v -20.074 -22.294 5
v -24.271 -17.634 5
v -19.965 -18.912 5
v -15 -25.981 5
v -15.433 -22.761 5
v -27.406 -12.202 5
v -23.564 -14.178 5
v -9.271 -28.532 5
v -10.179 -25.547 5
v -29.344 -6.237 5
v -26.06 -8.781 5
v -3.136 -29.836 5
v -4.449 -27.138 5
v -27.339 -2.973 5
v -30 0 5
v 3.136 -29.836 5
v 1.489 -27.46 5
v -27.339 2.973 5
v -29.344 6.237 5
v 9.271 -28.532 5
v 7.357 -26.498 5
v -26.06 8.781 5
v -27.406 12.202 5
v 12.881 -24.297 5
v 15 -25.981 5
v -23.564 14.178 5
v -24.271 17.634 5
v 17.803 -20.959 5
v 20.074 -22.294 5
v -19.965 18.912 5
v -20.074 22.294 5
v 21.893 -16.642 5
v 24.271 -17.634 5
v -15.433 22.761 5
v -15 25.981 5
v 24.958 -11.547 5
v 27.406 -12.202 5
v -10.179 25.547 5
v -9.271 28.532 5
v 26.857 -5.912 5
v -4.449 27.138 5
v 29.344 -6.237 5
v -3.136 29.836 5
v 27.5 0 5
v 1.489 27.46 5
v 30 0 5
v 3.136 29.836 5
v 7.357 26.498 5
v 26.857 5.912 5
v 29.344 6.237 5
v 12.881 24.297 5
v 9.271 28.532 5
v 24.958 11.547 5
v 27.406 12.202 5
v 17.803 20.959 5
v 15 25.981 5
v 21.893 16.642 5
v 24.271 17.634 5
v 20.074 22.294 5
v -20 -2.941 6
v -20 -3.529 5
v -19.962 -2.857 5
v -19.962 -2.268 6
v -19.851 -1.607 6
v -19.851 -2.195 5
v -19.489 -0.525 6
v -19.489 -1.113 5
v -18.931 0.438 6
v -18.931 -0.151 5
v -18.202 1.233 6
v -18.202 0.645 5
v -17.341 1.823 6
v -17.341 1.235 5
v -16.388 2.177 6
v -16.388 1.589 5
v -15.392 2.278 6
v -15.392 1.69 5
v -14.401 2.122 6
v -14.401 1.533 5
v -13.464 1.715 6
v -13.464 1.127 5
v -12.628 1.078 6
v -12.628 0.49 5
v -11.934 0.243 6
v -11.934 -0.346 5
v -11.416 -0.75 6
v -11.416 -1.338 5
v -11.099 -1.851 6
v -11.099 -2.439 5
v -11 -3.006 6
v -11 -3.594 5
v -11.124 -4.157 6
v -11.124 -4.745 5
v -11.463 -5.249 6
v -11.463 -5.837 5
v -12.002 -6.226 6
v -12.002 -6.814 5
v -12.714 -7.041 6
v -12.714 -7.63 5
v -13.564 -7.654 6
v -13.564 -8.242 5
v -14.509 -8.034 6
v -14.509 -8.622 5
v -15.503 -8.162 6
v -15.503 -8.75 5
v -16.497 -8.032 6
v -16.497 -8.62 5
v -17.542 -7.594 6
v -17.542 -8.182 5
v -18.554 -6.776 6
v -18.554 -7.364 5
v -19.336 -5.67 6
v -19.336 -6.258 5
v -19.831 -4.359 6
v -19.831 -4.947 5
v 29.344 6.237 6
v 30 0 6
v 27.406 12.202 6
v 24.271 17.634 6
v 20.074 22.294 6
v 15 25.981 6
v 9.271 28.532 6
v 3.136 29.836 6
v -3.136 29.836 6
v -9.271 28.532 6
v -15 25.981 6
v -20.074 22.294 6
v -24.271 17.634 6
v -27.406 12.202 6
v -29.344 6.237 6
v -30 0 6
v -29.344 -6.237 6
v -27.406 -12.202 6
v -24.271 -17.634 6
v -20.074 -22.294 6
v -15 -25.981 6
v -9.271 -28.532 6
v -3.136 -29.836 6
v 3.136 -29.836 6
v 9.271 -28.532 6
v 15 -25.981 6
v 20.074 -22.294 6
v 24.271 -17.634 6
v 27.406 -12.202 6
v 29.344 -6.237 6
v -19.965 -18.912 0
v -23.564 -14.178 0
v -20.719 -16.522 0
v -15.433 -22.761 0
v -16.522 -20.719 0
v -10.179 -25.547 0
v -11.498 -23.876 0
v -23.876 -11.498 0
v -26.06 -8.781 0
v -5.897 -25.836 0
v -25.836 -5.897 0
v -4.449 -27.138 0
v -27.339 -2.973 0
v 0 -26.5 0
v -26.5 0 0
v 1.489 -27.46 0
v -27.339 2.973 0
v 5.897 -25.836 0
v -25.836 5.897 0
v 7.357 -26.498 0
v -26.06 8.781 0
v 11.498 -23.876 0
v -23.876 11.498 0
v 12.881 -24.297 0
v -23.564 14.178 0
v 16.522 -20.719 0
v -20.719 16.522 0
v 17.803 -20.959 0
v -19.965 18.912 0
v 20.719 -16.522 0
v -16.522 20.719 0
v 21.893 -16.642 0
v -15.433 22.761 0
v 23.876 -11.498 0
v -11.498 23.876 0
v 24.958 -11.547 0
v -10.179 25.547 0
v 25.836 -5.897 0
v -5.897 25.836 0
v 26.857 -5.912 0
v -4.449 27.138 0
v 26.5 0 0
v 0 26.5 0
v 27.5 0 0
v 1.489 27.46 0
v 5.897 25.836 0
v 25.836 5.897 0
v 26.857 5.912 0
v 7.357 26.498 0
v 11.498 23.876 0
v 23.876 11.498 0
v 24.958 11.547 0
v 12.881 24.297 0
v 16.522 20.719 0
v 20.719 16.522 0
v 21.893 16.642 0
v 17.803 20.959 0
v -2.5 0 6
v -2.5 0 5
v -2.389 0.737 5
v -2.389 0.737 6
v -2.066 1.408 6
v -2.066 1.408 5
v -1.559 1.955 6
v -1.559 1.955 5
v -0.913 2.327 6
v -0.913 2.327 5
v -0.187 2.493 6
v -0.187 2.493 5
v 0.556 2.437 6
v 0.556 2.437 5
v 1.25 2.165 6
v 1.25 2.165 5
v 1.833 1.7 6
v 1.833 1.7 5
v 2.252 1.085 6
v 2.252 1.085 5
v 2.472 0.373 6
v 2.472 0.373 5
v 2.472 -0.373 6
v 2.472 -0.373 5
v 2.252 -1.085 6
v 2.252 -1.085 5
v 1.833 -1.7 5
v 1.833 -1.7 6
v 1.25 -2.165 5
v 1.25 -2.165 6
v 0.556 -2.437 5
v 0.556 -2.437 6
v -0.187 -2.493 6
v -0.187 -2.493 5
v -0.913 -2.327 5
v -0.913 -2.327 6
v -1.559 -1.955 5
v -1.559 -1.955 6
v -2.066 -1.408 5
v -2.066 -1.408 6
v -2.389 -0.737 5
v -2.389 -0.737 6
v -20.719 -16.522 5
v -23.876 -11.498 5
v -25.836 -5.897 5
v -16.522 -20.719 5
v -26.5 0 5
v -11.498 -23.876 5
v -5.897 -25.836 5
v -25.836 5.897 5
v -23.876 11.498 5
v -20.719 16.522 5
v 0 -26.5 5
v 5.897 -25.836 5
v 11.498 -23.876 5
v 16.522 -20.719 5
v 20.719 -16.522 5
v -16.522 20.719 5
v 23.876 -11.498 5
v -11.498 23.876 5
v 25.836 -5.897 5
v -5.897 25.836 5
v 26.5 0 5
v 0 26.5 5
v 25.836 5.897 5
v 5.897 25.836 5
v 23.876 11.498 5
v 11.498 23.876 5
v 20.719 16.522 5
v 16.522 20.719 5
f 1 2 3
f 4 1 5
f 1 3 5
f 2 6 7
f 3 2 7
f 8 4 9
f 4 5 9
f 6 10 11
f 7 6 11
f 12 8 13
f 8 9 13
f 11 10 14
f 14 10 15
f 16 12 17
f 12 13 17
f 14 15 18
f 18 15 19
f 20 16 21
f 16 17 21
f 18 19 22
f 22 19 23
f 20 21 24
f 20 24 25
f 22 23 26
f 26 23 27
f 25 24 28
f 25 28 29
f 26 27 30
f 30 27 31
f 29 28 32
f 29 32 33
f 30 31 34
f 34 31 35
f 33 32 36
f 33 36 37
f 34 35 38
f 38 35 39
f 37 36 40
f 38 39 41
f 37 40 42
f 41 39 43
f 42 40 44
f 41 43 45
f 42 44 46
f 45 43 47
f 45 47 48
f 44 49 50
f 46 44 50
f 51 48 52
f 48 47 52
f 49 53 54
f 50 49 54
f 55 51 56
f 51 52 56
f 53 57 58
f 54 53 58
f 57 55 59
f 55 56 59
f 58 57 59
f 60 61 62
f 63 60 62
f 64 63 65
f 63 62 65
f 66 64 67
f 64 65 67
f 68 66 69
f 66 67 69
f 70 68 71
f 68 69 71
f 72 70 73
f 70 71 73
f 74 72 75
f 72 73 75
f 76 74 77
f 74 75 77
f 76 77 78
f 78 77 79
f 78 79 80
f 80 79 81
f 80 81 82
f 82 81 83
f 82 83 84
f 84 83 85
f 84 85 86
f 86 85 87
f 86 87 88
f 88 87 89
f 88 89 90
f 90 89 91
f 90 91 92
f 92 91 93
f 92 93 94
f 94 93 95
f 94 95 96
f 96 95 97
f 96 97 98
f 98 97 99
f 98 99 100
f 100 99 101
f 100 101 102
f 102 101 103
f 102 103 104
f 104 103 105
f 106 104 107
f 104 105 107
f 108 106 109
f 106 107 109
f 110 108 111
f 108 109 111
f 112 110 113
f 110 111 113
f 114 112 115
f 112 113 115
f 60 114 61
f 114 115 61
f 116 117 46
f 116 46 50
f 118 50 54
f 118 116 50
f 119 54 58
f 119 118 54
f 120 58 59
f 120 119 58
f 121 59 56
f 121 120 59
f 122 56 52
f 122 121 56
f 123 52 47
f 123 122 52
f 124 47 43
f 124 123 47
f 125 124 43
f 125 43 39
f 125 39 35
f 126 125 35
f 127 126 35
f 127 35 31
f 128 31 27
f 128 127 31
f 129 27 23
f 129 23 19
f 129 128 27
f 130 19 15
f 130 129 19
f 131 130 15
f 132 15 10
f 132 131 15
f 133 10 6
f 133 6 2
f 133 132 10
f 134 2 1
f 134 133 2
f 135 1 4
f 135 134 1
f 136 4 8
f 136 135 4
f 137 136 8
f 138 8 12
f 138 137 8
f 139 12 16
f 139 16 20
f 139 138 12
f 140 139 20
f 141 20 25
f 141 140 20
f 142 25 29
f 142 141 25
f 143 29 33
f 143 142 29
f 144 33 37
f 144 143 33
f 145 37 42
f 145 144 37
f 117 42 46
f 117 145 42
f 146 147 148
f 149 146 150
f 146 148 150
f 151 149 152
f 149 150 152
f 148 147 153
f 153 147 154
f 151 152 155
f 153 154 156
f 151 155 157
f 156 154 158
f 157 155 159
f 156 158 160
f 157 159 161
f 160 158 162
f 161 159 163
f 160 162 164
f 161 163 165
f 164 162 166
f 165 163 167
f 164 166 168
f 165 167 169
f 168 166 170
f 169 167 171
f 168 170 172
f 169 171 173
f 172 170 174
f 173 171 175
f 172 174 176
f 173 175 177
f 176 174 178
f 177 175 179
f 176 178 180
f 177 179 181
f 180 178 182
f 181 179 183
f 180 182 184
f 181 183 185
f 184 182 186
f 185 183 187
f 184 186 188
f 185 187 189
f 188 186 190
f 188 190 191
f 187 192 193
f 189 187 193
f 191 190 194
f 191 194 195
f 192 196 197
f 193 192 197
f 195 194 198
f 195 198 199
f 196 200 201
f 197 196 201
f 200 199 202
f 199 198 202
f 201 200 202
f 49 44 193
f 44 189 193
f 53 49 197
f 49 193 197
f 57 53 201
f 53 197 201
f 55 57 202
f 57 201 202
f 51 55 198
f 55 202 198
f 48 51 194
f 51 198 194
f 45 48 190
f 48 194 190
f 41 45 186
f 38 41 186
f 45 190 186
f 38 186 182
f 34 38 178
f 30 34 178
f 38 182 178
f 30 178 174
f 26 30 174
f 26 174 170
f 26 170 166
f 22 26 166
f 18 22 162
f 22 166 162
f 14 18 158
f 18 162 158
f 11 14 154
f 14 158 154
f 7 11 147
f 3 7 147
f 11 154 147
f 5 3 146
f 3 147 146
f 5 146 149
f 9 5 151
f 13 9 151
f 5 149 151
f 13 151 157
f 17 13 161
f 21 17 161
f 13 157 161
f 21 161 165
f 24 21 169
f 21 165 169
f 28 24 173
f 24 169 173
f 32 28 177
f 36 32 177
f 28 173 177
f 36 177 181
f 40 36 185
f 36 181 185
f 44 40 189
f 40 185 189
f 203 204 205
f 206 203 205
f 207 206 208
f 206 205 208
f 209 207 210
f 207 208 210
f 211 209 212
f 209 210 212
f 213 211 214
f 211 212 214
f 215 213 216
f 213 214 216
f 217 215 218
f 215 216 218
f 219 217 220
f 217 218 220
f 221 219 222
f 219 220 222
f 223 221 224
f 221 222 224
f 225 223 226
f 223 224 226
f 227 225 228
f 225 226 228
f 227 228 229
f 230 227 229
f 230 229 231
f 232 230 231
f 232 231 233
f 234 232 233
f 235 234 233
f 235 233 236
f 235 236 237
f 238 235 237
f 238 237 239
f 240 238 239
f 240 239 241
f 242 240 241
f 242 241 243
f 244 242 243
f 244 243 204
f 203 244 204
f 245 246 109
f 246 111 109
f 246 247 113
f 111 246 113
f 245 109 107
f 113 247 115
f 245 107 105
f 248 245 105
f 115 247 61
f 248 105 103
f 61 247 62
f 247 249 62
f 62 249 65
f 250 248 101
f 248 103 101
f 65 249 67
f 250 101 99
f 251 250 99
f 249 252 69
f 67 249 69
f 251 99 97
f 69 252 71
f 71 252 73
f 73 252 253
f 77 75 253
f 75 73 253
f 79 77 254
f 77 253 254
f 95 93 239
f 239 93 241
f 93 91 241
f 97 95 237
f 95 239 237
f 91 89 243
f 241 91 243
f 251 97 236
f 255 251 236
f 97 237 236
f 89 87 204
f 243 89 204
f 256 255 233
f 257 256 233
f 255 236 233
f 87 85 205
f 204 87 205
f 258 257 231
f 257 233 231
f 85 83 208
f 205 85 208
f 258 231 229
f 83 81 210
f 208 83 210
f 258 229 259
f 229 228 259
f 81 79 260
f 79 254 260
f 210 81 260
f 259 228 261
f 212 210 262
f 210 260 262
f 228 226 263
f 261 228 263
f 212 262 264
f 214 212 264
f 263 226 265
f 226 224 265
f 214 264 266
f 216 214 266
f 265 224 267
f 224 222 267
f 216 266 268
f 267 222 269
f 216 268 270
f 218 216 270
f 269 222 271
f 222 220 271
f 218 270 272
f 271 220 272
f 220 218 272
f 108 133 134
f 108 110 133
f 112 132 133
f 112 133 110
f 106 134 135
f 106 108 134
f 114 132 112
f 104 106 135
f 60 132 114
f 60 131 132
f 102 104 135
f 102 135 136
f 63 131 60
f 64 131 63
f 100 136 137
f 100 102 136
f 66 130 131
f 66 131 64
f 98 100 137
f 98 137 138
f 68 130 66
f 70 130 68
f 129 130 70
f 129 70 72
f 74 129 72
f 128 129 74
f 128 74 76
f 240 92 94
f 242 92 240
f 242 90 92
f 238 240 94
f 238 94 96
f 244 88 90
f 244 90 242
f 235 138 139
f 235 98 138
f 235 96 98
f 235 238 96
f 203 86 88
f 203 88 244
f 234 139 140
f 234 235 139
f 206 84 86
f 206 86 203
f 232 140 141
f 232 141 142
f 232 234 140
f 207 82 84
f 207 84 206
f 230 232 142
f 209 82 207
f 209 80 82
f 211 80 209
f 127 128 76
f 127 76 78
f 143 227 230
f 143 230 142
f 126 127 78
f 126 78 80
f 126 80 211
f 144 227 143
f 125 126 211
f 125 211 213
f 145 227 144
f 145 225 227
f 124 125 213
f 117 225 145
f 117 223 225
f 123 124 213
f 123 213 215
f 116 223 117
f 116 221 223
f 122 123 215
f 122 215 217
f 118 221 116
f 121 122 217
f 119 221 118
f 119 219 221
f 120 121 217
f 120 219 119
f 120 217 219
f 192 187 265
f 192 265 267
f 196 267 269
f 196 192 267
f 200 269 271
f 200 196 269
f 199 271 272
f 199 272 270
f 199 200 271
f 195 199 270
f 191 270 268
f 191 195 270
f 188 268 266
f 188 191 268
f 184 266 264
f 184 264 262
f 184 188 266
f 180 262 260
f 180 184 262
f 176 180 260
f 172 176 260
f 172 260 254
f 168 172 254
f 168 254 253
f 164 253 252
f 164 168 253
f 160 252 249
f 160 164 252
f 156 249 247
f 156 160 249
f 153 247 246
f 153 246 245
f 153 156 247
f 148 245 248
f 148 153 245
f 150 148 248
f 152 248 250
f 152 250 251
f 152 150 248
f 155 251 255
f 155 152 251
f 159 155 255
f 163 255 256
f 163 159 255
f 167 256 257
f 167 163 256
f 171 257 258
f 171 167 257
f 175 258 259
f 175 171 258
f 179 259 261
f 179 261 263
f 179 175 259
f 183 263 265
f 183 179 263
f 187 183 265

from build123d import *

# Parameters (mm, degrees)
F0_R      = 27.5
F0_R_2    = 26.5
F1_DEPTH  = 5
F2_R      = 27.5
F3_DEPTH  = 1
F5_DEPTH  = 25
F6_DEPTH  = 6
F8_D      = 9
F8_DEPTH  = 30
F8_TIP    = 2.7038727856
F9_DEPTH  = 25
F11_D     = 5
F11_DEPTH = 30
F11_TIP   = 1.5021515476
F12_R     = 30
F12_R_2   = 27.5
F13_DEPTH = 1


with BuildPart() as f1:
    # F0 (on Top) → F1 (new body)
    with BuildSketch(Plane.XY):
        Circle(F0_R)
        Circle(F0_R_2, mode=Mode.SUBTRACT)
    extrude(amount=F1_DEPTH)

    # F2 (on face) → F3 (join)
    with BuildSketch(Plane.XY.offset(5)):
        Circle(F2_R)
    extrude(amount=F3_DEPTH)

    # F4 (on Right) → F5 (join)
    with BuildSketch(Plane.YZ):
        Polygon((-8.5, 6), (0, 6), (8.5, 6), (-8.5, 16), align=None)
    extrude(amount=-F5_DEPTH)

    # F6 (cut): a face of the model
    f6_faces = [f1.faces().sort_by_distance(p)[0] for p in [
        (0, -2.8333333333, 9.3333333333),
    ]]
    extrude(f6_faces, amount=-F6_DEPTH, mode=Mode.SUBTRACT)

    # F8
    with Locations(Plane(origin=(0, 4.8071979434, 8.1722365039), x_dir=(1, 0, 0), z_dir=(0, 0.5070201266, 0.8619342152))):
        with Locations((-15.5, -5.5772213922)):
            Hole(F8_D / 2, depth=F8_DEPTH)
            with Locations((0, 0, -(F8_DEPTH + F8_TIP / 2))):  # 118° drill point
                Cone(0, F8_D / 2, F8_TIP, mode=Mode.SUBTRACT)

    # F9 (cut): a face of the model
    f9_faces = [f1.faces().sort_by_distance(p)[0] for p in [
        (-25, -2.8333333333, 9.3333333333),
    ]]
    extrude(f9_faces, amount=-F9_DEPTH, mode=Mode.SUBTRACT)

    # F11
    with Locations(Plane.XY.offset(6)):
        with Locations((0, 0)):
            Hole(F11_D / 2, depth=F11_DEPTH)
            with Locations((0, 0, -(F11_DEPTH + F11_TIP / 2))):  # 118° drill point
                Cone(0, F11_D / 2, F11_TIP, mode=Mode.SUBTRACT)

    # F12 (on face) → F13 (join)
    with BuildSketch(Plane.XY.offset(6)):
        Circle(F12_R)
        Circle(F12_R_2, mode=Mode.SUBTRACT)
    extrude(amount=-F13_DEPTH)


solid = f1.part
